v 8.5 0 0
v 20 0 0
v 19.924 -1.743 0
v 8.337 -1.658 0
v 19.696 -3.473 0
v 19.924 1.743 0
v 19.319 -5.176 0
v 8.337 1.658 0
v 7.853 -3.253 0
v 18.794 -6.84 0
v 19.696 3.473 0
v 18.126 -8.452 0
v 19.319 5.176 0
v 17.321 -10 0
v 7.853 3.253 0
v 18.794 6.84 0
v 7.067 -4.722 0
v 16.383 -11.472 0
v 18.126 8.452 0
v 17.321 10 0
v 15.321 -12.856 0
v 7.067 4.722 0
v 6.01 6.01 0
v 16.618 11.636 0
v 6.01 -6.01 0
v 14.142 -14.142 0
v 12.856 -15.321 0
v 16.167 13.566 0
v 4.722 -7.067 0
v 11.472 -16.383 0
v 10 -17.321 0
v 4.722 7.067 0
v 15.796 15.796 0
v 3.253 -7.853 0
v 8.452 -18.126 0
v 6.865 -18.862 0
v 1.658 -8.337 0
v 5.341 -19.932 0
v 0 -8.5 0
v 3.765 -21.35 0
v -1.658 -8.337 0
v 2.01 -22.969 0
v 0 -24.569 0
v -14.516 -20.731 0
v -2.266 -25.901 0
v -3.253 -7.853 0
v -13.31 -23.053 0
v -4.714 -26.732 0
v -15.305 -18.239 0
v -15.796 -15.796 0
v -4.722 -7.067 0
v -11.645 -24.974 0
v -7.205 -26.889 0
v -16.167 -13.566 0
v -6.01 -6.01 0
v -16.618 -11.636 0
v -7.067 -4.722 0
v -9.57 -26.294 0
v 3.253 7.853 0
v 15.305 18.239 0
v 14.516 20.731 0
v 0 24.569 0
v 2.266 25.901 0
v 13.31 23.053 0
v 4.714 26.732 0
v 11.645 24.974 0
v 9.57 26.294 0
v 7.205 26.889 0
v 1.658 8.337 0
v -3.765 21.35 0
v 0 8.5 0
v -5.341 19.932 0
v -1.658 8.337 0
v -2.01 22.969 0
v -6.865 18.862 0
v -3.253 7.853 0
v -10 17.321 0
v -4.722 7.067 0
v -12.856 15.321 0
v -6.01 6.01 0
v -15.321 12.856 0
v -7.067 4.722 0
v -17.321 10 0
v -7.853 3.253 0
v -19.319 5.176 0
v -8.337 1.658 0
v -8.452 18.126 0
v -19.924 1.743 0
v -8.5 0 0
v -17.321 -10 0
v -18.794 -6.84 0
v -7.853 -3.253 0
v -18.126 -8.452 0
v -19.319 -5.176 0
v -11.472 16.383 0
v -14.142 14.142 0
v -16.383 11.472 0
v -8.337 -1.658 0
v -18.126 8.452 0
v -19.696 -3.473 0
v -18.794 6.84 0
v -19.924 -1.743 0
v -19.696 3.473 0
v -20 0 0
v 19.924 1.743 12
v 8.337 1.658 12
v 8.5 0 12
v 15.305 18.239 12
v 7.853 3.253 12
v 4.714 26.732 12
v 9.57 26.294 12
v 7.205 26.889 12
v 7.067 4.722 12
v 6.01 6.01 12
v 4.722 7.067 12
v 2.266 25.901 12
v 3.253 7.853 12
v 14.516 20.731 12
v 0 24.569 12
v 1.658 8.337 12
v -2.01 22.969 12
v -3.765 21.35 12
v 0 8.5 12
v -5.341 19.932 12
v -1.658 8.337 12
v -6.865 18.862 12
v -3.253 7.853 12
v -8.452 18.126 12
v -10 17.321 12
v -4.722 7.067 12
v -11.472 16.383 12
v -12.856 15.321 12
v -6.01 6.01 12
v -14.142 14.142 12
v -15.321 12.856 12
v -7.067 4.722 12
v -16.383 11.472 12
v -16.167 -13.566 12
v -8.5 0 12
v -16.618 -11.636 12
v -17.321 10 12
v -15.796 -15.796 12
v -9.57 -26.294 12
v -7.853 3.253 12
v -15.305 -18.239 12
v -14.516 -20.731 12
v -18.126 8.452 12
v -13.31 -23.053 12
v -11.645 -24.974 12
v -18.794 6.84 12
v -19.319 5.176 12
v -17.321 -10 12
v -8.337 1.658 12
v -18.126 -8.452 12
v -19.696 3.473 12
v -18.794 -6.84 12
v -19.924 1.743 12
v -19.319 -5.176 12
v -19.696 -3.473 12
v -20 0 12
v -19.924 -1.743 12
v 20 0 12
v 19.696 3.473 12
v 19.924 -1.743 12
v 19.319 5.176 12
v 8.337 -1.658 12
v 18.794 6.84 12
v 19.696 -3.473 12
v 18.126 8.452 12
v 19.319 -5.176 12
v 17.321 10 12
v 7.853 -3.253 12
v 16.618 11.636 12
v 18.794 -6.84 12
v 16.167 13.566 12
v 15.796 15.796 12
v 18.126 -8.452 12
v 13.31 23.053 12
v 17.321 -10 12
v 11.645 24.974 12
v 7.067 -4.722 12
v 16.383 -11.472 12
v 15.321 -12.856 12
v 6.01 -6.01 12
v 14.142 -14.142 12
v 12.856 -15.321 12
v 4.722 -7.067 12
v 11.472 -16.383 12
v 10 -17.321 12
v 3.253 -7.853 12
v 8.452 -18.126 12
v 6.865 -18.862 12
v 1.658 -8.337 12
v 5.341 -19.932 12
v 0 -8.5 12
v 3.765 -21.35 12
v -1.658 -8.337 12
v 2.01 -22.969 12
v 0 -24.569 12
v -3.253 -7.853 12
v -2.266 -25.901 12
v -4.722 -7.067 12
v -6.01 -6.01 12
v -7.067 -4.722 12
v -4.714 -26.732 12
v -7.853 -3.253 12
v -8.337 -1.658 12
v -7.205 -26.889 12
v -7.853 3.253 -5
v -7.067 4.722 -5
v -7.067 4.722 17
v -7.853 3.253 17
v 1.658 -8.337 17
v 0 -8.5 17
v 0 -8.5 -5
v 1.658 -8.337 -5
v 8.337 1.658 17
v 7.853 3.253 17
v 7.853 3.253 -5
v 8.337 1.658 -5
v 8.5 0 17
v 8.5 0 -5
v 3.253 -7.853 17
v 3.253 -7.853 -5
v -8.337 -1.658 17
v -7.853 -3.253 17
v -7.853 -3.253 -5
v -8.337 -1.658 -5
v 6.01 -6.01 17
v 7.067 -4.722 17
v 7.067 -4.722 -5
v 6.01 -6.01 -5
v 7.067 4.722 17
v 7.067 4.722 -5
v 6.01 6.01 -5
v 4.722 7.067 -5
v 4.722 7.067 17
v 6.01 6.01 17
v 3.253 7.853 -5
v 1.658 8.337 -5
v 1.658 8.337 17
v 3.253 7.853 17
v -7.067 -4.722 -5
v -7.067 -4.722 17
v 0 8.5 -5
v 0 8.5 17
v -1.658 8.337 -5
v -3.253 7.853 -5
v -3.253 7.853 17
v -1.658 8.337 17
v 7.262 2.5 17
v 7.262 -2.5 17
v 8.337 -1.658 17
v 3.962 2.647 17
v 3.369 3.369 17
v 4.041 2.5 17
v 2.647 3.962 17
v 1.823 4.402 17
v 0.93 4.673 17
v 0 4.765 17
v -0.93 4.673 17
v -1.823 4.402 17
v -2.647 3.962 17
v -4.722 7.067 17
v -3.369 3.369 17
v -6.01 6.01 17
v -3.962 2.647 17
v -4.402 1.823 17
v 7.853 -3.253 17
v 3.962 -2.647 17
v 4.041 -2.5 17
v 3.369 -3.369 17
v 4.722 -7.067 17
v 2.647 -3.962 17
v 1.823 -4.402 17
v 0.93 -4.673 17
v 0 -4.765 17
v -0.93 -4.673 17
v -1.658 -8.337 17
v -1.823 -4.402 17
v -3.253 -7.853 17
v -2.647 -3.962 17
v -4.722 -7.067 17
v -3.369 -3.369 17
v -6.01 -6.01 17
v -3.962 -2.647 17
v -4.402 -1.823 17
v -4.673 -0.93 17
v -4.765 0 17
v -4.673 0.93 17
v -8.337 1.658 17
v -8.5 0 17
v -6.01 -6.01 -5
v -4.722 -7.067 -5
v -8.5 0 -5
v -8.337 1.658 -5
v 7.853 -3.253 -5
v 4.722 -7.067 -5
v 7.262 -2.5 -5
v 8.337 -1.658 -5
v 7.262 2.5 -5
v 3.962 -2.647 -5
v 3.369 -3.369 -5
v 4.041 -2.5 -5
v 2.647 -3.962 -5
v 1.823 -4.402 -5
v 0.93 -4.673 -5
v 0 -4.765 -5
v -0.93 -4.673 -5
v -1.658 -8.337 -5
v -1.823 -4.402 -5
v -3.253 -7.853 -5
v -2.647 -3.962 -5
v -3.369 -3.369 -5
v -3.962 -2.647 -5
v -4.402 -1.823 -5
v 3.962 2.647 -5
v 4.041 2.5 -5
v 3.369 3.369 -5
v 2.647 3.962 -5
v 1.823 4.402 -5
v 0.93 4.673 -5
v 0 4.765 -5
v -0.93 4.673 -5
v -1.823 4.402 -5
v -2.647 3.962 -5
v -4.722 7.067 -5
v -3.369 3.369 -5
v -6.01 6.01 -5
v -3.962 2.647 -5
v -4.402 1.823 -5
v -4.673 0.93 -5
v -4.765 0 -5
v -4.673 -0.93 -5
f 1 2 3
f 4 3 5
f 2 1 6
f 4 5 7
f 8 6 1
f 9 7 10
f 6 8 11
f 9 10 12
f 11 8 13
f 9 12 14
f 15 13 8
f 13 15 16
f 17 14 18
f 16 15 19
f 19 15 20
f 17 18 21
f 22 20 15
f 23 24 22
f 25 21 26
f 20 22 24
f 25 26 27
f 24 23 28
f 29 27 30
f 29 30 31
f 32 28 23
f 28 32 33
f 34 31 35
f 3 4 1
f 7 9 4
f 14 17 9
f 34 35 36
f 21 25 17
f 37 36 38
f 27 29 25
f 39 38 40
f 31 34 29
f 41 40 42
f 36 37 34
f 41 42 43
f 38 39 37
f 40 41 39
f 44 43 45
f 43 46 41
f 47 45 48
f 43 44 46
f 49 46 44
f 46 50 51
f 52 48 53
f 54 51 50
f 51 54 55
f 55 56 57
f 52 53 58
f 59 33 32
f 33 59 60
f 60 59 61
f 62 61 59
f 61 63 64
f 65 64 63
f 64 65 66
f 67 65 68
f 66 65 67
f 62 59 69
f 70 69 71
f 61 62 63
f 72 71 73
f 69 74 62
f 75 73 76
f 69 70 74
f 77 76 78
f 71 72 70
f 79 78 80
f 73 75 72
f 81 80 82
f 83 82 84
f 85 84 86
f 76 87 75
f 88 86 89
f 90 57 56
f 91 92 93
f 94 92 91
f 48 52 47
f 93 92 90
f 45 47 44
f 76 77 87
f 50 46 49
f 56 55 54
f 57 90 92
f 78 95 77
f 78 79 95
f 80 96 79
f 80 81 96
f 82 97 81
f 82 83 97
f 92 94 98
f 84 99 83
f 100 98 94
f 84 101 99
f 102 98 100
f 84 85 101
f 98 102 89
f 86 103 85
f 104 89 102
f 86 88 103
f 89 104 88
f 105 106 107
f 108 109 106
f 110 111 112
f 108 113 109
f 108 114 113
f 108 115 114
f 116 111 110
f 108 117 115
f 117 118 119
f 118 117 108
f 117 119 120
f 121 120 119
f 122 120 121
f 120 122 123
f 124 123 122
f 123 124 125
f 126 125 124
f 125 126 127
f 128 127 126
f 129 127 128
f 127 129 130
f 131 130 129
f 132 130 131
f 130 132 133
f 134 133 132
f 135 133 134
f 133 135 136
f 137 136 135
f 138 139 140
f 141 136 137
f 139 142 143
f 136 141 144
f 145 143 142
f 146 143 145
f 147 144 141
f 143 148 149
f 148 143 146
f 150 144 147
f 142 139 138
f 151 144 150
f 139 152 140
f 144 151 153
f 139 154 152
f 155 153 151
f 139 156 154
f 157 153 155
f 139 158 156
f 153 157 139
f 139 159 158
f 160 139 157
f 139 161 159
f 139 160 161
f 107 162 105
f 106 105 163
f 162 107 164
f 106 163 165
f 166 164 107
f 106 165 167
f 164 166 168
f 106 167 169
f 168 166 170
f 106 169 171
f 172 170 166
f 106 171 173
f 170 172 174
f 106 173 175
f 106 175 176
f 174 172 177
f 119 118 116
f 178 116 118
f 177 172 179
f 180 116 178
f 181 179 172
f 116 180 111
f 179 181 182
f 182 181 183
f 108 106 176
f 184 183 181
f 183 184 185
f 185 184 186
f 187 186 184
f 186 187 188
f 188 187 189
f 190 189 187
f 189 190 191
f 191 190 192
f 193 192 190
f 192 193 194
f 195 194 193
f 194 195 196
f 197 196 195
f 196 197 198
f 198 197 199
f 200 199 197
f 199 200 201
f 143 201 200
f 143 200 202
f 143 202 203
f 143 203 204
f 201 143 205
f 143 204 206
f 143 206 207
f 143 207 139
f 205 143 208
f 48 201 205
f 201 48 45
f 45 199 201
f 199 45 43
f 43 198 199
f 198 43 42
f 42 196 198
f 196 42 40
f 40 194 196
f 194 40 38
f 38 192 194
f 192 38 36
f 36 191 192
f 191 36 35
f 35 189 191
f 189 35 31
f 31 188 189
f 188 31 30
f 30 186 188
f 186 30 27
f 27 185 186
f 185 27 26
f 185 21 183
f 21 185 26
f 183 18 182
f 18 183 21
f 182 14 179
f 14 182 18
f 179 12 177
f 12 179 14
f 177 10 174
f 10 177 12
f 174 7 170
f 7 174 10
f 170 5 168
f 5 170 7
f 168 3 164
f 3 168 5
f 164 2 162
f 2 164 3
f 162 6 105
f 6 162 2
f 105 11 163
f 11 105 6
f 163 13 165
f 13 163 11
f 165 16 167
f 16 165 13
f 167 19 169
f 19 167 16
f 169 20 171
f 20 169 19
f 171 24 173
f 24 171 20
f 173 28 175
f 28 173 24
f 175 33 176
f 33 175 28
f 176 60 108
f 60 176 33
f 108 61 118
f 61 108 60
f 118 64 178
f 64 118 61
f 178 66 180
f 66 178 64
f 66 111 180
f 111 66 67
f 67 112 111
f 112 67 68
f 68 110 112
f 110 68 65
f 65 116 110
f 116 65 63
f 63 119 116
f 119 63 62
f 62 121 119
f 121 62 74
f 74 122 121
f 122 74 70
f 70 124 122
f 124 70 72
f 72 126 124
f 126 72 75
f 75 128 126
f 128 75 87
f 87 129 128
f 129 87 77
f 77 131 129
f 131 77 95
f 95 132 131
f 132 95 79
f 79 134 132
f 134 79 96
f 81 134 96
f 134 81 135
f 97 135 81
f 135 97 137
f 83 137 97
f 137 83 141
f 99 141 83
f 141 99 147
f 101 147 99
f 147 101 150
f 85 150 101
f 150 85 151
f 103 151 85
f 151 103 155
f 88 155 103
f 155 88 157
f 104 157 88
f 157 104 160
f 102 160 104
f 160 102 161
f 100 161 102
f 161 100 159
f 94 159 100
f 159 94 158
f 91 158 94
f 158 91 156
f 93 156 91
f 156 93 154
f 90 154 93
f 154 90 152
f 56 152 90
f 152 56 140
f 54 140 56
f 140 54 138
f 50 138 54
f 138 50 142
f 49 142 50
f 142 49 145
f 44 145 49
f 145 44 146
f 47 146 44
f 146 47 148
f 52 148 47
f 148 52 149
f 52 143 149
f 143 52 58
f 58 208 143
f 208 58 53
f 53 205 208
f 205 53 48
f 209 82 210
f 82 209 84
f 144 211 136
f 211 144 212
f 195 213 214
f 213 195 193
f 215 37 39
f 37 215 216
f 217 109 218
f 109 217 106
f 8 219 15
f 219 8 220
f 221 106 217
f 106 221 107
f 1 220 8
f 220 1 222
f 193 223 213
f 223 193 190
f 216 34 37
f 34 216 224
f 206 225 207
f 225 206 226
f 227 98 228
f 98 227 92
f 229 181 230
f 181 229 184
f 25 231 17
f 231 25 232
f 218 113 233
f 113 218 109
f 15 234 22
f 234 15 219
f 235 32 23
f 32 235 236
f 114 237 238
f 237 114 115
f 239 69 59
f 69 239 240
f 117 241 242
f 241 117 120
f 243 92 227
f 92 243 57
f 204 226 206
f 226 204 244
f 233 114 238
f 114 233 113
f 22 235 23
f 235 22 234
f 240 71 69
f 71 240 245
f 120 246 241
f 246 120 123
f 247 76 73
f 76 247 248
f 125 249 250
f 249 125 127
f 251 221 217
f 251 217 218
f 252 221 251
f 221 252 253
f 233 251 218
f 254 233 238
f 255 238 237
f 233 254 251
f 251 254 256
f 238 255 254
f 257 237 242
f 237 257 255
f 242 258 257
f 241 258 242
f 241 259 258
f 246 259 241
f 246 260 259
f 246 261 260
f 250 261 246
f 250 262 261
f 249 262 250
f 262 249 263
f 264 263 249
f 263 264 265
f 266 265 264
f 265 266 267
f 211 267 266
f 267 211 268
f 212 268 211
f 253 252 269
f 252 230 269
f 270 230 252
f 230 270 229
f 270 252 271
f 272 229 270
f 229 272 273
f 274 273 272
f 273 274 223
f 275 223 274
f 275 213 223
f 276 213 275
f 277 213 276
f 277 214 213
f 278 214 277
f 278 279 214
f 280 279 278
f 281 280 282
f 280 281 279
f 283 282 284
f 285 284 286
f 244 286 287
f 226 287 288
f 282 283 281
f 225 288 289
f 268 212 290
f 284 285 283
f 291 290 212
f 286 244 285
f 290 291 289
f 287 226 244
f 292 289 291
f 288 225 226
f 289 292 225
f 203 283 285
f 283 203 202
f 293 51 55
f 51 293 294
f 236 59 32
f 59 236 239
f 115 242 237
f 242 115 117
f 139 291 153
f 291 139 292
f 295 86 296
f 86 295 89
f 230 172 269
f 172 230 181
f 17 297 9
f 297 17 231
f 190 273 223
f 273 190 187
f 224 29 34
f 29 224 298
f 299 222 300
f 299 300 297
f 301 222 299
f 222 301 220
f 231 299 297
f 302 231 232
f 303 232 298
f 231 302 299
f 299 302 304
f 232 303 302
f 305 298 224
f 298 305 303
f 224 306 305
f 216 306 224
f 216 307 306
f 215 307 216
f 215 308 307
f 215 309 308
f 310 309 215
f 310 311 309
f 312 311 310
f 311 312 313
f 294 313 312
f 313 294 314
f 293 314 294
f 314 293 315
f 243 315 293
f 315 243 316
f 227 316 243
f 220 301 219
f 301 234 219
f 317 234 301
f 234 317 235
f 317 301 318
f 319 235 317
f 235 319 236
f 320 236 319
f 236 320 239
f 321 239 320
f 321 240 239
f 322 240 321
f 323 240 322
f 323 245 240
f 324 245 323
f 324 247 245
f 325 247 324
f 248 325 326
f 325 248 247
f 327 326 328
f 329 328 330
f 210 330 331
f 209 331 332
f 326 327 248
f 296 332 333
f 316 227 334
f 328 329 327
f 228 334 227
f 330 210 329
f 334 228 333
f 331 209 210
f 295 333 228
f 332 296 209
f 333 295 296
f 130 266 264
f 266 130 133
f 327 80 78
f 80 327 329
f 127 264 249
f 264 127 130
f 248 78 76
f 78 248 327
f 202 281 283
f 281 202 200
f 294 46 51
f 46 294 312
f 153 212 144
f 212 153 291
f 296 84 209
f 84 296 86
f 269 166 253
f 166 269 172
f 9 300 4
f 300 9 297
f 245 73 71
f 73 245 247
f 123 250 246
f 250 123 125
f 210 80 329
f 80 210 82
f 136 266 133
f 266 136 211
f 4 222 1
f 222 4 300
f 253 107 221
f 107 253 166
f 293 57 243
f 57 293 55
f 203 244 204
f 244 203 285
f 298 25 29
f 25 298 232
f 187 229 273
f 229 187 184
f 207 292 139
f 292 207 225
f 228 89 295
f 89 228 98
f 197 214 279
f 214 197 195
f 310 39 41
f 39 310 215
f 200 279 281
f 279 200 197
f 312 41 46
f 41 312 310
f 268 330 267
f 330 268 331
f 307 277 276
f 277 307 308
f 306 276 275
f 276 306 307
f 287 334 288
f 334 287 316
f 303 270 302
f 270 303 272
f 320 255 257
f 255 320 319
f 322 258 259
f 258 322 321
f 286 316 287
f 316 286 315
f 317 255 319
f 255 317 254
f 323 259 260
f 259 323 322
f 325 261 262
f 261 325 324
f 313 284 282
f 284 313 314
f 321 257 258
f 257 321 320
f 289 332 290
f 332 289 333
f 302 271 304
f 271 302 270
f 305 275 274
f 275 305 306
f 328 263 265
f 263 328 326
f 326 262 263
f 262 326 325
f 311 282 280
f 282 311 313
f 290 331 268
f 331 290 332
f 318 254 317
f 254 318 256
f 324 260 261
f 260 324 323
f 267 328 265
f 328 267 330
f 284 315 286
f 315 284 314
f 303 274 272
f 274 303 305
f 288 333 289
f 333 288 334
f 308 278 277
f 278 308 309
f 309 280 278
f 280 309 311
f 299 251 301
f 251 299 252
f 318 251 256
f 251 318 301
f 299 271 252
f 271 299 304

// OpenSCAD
$fn = 32;

// ----------------------------------------------------------------------
// Cam: base radius 20 mm with a 8 mm lift over 150 degrees
// ----------------------------------------------------------------------

// --- parameters (mm) ---
base_r = 20;              // base radius
lift = 8;                 // lift height above the base radius
lift_span = 150;          // angular width of the lift
lift_start = 30;          // angle where the lift starts
cam_t = 12;               // cam plate thickness
hub_d = 17;               // hub diameter
hub_h = 22;               // hub height
bore_d = 9.53;            // bore
key_w = 5;                // keyway width
key_depth = 1.74;         // keyway depth

cam_profile = [[20, 0], [19.924, 1.743], [19.696, 3.473], [19.319, 5.176], [18.794, 6.84], [18.126, 8.452], [17.321, 10], [16.618, 11.636], [16.167, 13.566], [15.796, 15.796], [15.305, 18.239], [14.516, 20.731], [13.31, 23.053], [11.645, 24.974], [9.57, 26.294], [7.205, 26.889], [4.714, 26.732], [2.266, 25.901], [0, 24.569], [-2.01, 22.969], [-3.765, 21.35], [-5.341, 19.932], [-6.865, 18.862], [-8.452, 18.126], [-10, 17.321], [-11.472, 16.383], [-12.856, 15.321], [-14.142, 14.142], [-15.321, 12.856], [-16.383, 11.472], [-17.321, 10], [-18.126, 8.452], [-18.794, 6.84], [-19.319, 5.176], [-19.696, 3.473], [-19.924, 1.743], [-20, 0], [-19.924, -1.743], [-19.696, -3.473], [-19.319, -5.176], [-18.794, -6.84], [-18.126, -8.452], [-17.321, -10], [-16.618, -11.636], [-16.167, -13.566], [-15.796, -15.796], [-15.305, -18.239], [-14.516, -20.731], [-13.31, -23.053], [-11.645, -24.974], [-9.57, -26.294], [-7.205, -26.889], [-4.714, -26.732], [-2.266, -25.901], [0, -24.569], [2.01, -22.969], [3.765, -21.35], [5.341, -19.932], [6.865, -18.862], [8.452, -18.126], [10, -17.321], [11.472, -16.383], [12.856, -15.321], [14.142, -14.142], [15.321, -12.856], [16.383, -11.472], [17.321, -10], [18.126, -8.452], [18.794, -6.84], [19.319, -5.176], [19.696, -3.473], [19.924, -1.743]];

difference() {
  union() {
    linear_extrude(height = cam_t) polygon(cam_profile);
    /* hub, proud of the cam plate on both sides */
    translate([0, 0, -5]) cylinder(h = hub_h, d = hub_d);
  }
  /* bore through the hub, 2.5 mm clear on both faces */
  translate([0, 0, -7.5]) cylinder(h = hub_h + 5, d = bore_d);
  /* keyway, milled through the whole hub */
  translate([3.022, -2.5, -7.5]) cube([4.24, 5, 27]);
}
